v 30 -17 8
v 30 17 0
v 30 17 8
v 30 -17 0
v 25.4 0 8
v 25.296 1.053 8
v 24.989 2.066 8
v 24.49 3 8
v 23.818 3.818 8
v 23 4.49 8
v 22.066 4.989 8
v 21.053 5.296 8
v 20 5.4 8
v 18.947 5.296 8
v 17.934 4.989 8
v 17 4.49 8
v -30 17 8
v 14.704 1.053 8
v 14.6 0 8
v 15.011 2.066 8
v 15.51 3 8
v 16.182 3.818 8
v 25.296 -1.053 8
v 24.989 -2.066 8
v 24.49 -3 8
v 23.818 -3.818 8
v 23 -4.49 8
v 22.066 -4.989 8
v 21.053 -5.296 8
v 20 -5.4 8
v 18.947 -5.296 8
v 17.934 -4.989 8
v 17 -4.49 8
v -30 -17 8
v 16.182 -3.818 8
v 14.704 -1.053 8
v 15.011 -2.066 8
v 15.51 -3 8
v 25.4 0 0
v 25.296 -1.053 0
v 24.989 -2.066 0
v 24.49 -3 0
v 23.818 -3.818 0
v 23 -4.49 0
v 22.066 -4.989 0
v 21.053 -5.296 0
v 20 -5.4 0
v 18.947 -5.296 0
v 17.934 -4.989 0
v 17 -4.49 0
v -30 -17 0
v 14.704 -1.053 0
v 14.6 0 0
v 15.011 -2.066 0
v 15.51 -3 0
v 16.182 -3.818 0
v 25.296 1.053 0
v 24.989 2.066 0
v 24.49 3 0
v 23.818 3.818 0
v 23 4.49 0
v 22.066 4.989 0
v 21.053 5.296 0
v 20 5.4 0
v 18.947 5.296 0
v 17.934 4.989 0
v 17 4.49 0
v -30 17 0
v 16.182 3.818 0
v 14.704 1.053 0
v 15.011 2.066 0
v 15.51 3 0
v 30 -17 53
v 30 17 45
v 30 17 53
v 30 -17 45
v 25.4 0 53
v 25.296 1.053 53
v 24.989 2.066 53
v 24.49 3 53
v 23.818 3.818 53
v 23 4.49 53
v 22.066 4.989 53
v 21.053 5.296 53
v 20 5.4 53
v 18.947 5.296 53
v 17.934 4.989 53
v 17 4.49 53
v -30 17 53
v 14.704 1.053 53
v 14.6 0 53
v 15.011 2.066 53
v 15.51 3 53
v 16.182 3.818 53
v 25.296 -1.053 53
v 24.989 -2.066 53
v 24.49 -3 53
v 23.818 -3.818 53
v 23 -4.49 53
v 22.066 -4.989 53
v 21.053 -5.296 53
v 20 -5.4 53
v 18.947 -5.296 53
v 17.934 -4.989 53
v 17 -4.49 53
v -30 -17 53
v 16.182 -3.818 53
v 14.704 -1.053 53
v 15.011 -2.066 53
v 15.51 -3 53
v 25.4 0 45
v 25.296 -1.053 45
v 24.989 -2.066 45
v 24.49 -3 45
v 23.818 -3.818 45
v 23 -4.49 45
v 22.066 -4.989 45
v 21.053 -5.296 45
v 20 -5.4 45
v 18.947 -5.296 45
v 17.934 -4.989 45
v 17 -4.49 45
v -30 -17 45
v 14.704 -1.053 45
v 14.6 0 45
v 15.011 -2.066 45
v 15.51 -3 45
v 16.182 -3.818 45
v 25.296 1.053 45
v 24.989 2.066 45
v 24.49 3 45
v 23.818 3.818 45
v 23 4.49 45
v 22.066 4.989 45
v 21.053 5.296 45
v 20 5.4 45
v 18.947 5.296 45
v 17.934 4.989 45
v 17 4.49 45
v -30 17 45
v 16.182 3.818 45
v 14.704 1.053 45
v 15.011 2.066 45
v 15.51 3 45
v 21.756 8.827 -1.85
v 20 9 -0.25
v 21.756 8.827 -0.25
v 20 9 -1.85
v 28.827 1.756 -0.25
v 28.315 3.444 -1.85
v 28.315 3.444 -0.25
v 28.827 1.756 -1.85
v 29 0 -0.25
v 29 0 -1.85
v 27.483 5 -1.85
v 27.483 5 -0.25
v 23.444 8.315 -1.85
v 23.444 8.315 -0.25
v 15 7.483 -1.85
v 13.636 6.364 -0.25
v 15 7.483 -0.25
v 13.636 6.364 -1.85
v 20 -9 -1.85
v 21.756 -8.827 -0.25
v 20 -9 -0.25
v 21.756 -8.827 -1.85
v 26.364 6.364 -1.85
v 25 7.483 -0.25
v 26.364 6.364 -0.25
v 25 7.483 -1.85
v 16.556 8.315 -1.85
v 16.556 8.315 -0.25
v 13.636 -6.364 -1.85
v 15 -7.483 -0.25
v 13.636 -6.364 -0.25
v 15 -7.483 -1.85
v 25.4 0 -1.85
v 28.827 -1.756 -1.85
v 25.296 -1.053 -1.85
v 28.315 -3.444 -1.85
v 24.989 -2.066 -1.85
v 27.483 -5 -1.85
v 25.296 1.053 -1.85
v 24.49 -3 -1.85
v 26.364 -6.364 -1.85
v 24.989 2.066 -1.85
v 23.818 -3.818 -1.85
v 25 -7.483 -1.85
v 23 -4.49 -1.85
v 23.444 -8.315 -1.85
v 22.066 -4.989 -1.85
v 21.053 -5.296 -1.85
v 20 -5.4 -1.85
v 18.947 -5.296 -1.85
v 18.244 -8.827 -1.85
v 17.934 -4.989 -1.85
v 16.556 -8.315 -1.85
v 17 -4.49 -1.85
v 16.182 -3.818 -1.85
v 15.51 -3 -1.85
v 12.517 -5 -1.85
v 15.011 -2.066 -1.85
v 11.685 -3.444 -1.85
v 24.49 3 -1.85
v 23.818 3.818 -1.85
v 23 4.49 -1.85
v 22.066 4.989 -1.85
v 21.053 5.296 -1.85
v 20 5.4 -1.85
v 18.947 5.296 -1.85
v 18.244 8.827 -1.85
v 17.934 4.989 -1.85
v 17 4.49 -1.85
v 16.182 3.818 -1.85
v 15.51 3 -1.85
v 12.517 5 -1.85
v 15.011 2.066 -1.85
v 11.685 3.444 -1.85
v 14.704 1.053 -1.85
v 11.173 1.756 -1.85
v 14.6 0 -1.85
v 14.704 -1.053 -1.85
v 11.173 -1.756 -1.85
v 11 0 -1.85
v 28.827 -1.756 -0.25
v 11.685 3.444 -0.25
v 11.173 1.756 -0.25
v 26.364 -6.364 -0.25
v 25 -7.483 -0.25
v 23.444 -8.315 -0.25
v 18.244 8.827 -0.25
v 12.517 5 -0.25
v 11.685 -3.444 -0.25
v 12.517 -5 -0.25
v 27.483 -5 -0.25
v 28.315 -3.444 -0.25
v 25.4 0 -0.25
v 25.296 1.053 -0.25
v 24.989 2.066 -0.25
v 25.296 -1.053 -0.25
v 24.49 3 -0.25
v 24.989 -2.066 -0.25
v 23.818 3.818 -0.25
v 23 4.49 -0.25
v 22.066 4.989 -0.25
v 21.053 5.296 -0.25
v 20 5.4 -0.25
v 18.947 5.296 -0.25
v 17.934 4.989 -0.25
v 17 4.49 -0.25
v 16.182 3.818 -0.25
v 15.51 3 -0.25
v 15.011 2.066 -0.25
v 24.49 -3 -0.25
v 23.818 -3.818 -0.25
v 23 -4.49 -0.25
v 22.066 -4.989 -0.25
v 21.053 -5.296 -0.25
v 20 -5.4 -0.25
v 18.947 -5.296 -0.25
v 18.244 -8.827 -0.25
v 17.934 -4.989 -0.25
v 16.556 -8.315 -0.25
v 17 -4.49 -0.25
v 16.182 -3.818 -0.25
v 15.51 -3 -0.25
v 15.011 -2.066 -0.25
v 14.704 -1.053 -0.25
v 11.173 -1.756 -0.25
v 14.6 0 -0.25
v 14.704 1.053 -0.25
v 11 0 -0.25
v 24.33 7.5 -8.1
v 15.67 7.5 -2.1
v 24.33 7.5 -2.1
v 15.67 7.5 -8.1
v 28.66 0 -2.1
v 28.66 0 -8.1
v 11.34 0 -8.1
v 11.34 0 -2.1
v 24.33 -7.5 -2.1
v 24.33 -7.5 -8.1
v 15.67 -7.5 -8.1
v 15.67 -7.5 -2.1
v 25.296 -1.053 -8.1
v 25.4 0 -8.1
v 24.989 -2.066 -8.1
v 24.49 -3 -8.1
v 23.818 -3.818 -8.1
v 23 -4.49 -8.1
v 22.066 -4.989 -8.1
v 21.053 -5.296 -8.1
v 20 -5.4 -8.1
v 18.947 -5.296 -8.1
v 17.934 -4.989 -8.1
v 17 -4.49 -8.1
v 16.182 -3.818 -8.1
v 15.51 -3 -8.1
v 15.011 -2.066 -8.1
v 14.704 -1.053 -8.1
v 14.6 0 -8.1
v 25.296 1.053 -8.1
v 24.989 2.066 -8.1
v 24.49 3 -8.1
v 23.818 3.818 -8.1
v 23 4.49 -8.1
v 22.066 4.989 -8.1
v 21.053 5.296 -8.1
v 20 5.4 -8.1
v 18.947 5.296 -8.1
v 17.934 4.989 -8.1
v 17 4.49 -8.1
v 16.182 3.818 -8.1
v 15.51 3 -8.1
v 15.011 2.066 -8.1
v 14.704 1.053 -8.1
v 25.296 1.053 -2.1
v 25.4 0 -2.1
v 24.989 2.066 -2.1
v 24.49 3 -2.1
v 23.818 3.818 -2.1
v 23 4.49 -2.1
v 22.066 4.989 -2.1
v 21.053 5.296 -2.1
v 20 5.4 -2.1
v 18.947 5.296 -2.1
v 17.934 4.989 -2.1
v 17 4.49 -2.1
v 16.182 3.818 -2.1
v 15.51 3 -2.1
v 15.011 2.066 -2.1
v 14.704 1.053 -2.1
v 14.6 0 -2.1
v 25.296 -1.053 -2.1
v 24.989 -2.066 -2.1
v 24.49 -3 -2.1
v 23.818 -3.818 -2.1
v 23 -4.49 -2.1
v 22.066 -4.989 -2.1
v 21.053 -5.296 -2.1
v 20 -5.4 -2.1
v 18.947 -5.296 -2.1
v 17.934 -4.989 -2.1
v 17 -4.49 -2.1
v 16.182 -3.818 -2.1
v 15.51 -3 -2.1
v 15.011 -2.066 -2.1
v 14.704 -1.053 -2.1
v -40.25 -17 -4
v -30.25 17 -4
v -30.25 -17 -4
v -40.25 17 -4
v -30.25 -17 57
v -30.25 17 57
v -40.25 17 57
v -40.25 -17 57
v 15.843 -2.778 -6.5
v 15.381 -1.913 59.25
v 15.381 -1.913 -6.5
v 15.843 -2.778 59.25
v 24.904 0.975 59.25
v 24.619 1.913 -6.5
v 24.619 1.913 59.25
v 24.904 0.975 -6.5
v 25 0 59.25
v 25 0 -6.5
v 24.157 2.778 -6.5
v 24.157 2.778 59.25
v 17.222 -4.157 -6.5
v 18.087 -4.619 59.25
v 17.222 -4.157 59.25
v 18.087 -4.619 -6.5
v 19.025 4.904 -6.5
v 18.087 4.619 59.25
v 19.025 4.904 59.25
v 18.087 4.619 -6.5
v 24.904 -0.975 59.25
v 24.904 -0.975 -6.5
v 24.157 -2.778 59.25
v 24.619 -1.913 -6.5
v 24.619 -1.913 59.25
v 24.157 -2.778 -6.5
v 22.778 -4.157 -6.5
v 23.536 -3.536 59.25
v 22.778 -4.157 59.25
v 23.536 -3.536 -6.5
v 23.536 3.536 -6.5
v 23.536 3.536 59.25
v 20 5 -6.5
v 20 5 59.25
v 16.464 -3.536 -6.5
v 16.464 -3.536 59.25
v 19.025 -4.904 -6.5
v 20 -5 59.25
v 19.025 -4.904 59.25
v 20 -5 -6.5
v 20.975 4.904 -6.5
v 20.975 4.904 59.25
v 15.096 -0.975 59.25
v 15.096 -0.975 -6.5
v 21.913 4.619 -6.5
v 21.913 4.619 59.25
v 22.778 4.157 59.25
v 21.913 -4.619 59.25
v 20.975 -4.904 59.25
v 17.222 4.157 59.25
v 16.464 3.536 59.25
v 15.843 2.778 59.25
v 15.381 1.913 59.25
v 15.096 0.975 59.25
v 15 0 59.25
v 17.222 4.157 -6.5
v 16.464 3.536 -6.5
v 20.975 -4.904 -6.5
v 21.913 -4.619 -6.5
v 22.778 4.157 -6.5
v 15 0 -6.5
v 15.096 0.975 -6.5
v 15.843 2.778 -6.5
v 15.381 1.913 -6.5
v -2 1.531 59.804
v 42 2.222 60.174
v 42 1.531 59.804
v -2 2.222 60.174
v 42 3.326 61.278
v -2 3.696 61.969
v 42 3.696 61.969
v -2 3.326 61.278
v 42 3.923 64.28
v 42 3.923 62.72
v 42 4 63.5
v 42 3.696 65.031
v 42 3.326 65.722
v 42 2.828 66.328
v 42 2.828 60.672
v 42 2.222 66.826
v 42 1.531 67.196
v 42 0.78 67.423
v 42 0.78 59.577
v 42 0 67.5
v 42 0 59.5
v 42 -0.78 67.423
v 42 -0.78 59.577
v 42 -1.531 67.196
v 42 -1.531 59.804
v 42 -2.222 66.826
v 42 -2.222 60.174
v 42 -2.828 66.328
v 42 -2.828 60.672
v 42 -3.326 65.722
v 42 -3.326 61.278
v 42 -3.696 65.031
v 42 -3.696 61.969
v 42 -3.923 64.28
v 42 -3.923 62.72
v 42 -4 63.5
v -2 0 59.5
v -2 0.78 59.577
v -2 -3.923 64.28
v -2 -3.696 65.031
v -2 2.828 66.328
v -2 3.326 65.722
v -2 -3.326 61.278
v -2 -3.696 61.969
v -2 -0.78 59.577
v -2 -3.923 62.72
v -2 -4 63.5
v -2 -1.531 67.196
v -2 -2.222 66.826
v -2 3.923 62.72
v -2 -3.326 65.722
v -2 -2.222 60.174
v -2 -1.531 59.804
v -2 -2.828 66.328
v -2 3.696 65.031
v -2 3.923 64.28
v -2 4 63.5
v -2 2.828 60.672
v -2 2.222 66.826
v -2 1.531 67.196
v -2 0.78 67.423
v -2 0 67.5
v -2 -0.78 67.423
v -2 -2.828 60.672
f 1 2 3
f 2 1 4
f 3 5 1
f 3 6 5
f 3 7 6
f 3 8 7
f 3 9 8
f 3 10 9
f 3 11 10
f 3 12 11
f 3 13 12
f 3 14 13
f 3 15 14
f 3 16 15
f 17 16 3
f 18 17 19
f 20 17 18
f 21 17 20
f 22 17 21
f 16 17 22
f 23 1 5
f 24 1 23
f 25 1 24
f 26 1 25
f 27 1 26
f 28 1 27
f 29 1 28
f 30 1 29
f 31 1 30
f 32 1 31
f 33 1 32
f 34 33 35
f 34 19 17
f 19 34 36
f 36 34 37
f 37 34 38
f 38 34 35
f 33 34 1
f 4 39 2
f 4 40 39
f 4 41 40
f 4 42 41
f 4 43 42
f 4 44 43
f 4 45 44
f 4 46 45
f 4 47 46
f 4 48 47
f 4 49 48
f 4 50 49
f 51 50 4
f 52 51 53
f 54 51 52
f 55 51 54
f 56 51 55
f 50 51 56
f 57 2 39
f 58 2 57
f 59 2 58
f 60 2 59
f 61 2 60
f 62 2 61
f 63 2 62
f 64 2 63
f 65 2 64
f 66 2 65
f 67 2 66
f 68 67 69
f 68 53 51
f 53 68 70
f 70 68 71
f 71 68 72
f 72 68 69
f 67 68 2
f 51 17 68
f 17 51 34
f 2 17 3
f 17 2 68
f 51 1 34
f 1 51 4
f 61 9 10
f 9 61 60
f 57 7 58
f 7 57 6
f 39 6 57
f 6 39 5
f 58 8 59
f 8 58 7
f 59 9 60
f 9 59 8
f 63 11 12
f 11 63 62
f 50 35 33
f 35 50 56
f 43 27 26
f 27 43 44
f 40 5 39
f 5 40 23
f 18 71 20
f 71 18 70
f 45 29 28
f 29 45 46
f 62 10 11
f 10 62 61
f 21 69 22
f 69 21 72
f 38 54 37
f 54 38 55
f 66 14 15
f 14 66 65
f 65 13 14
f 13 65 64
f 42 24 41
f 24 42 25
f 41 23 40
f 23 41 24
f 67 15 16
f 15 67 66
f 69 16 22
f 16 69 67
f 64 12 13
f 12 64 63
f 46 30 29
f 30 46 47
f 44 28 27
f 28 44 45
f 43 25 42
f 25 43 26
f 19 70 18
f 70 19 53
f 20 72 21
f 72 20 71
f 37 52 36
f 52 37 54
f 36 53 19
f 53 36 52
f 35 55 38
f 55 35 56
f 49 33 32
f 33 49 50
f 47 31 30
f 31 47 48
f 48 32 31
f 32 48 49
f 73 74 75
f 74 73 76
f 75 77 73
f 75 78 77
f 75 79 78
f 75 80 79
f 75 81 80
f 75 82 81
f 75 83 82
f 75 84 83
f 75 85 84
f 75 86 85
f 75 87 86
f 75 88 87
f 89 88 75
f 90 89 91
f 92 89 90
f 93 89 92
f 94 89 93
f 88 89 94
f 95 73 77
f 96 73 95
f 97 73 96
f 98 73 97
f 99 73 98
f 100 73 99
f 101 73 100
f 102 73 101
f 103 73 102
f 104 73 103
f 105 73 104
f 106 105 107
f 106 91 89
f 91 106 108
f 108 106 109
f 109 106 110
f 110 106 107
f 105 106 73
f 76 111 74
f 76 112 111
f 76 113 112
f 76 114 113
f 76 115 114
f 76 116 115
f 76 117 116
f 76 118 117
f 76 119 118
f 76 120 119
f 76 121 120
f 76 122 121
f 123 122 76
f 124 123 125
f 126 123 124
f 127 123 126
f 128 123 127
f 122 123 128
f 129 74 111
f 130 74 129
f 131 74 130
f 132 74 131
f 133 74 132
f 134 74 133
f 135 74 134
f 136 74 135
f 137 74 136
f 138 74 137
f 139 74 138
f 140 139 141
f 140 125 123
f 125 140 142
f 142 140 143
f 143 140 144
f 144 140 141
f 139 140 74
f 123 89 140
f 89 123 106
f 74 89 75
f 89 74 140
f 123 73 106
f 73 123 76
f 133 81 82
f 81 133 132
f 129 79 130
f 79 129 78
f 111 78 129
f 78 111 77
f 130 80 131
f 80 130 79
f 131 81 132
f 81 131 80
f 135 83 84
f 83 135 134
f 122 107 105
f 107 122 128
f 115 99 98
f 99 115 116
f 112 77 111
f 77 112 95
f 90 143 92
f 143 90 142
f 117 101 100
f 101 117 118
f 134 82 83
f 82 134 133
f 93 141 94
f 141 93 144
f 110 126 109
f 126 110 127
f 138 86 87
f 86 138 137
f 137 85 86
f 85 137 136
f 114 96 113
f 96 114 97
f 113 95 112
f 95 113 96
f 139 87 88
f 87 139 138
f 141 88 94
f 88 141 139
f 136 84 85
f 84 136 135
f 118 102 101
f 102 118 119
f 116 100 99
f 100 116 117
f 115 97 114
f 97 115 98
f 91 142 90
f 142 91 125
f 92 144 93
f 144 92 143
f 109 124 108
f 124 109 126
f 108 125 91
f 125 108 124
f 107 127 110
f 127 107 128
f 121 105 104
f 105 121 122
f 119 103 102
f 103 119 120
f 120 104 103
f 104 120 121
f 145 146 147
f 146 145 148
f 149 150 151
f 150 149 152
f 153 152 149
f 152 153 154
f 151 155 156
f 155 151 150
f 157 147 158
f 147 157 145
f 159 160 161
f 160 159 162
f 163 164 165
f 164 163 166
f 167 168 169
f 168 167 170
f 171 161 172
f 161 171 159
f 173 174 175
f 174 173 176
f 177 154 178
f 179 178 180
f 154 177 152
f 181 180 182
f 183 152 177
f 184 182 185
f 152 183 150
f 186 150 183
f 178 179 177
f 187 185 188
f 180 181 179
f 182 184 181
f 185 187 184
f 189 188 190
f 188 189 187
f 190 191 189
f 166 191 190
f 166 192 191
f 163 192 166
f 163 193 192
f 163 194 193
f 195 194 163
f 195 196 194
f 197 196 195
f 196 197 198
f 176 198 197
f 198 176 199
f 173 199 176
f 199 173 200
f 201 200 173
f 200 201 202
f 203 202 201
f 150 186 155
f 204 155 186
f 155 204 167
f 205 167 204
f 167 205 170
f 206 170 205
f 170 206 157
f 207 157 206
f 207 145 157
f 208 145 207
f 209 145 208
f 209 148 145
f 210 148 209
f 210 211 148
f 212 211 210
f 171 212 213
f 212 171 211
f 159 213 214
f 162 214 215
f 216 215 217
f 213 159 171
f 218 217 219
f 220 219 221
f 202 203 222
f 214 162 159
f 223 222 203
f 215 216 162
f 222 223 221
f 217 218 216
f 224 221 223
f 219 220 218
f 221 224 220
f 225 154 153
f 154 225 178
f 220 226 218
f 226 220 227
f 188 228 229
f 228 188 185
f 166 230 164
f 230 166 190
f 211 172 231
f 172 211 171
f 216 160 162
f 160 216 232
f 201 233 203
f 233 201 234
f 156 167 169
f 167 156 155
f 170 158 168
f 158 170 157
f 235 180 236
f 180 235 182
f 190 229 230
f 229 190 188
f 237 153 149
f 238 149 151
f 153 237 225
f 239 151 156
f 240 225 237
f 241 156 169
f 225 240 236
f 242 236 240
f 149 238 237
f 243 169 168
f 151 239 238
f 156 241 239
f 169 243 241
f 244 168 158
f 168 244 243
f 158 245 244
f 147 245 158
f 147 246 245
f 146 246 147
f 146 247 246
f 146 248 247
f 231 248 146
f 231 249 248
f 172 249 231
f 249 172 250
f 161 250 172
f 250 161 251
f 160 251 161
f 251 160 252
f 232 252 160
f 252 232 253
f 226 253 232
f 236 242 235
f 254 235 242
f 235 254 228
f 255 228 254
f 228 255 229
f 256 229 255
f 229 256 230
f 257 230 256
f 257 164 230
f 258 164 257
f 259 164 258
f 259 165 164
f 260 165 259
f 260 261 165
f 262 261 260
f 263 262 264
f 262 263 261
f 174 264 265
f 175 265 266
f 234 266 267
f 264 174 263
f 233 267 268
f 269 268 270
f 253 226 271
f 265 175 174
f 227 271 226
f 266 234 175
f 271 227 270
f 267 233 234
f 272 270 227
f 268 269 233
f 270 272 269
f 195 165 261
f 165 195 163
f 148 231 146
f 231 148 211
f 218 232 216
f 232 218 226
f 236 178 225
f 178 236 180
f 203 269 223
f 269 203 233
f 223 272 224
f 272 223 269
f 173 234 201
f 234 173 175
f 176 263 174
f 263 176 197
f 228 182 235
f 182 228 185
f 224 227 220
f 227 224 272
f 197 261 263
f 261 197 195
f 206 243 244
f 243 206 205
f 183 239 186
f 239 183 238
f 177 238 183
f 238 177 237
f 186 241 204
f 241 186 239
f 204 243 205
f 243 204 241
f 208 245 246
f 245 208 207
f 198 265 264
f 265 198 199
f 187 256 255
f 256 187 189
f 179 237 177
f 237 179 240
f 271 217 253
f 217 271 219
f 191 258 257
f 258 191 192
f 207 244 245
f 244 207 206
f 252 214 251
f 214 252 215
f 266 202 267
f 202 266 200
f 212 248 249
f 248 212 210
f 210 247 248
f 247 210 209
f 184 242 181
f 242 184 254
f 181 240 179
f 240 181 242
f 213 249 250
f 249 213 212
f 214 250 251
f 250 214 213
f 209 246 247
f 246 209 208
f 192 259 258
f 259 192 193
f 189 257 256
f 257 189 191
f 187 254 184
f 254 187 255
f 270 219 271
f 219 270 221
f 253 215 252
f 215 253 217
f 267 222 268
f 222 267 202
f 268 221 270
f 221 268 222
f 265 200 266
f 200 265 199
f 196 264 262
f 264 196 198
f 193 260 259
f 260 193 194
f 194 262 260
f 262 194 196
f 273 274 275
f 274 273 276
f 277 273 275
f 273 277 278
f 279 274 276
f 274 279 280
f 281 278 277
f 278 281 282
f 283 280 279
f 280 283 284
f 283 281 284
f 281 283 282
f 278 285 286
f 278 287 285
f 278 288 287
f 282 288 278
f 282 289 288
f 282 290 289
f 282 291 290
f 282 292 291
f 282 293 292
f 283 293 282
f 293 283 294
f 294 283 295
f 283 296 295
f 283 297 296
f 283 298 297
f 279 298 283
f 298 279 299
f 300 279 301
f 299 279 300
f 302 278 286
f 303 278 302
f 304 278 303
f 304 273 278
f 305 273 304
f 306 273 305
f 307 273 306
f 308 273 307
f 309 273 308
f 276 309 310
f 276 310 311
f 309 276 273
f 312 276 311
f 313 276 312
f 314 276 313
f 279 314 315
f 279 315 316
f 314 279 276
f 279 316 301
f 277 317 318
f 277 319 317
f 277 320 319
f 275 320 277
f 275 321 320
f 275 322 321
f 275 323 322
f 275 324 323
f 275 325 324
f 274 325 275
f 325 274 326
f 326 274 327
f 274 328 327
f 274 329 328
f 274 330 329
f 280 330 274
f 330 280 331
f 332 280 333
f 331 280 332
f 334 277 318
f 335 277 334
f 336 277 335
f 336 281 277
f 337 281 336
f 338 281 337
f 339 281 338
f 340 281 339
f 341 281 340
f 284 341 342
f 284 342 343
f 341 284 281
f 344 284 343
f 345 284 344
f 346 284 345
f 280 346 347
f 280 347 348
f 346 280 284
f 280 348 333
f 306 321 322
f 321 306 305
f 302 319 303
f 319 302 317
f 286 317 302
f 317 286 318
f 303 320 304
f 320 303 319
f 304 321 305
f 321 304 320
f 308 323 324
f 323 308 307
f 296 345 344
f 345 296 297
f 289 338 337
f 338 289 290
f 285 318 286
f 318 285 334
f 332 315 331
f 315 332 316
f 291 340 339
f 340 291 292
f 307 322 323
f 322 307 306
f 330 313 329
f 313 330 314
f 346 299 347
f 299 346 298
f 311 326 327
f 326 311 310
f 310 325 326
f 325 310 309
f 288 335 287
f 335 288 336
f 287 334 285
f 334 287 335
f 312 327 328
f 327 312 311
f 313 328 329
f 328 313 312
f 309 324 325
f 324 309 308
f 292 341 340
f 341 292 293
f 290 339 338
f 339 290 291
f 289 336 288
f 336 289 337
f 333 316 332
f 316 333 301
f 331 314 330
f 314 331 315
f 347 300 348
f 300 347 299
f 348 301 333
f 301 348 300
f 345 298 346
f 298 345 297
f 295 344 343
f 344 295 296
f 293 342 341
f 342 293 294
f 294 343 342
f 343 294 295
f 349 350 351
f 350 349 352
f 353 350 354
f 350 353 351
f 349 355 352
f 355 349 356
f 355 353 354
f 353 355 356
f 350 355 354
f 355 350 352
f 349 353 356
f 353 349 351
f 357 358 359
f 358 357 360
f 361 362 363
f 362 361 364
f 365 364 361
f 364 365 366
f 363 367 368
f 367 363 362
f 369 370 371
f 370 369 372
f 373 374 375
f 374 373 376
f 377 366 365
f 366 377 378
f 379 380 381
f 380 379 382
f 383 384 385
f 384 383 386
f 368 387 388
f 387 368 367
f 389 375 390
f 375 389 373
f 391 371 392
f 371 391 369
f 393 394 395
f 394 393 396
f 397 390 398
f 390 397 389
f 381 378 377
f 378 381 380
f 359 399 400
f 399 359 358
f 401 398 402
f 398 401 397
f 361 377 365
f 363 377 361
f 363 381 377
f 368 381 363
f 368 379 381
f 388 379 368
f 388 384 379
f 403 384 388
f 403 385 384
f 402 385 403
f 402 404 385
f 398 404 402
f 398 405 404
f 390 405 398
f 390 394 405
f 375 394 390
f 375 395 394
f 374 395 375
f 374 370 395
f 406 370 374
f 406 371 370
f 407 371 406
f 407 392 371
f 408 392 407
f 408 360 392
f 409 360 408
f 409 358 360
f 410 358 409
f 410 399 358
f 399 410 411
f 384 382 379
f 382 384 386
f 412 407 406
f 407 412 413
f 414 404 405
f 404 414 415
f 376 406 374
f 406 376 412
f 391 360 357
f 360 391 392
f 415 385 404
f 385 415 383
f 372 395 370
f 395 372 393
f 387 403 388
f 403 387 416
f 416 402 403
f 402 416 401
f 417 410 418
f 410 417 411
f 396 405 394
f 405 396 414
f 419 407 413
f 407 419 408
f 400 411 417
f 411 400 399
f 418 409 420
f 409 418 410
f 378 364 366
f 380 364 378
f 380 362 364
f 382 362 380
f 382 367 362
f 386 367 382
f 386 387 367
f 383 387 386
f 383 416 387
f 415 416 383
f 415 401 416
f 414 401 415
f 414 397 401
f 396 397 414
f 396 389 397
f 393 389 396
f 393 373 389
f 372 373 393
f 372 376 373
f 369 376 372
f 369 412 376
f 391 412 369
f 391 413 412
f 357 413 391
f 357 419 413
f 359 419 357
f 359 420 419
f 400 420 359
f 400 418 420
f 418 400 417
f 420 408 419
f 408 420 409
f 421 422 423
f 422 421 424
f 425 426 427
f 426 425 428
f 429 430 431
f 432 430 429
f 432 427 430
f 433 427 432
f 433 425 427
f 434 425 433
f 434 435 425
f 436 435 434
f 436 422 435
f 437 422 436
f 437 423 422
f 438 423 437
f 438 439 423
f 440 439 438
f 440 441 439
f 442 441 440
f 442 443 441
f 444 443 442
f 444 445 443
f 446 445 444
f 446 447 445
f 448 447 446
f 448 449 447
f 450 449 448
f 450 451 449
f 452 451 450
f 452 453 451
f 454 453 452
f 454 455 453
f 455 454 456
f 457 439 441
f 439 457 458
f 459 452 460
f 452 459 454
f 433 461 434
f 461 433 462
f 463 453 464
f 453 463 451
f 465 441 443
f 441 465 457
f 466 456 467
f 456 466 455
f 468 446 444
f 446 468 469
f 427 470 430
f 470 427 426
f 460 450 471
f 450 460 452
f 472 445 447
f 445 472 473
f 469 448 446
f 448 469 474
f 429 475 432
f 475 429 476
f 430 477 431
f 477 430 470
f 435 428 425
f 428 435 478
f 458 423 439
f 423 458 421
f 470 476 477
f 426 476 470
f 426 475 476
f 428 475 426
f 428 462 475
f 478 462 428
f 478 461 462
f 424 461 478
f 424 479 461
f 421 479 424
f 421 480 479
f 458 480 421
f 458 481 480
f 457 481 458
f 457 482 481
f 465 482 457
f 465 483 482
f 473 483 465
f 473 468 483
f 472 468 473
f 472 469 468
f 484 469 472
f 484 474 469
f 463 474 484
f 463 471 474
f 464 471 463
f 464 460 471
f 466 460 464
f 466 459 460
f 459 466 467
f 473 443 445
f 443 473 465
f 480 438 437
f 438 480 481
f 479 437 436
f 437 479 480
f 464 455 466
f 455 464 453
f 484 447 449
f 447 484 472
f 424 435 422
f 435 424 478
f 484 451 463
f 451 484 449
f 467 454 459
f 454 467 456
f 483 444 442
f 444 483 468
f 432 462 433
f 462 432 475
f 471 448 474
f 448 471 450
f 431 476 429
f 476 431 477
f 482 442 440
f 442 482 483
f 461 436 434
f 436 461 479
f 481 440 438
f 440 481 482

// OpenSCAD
$fn = 32;

// ------------------------------------------------------------------------
// C clamp: throat 45 mm, screw d10
// Every part is its own module, assembly() places every instance.
// ------------------------------------------------------------------------

// --- part 1 ---
module clamp_arm() {
  difference() {
    translate([-30, -17, 0]) cube([60, 34, 8]);
    translate([20, 0, -1]) cylinder(h = 10, d = 10.8);
  }
}

// --- part 2 ---
module clamp_spine() {
  difference() {
    translate([-30.5, -17, 0]) cube([61, 34, 10]);
  }
}

// --- part 3 ---
module clamp_screw() {
  translate([0, 0, -32.875]) cylinder(h = 65.75, d = 10);
}

// --- part 4 ---
module clamp_washer() {
  difference() {
      translate([0, 0, 0]) cylinder(h = 1.6, d = 18);
      translate([0, 0, -1]) cylinder(h = 3.6, d = 10.8);
    }
}

// --- part 5 ---
module clamp_nut() {
  difference() {
    linear_extrude(height = 6) polygon(points = [[8.66, 0], [4.33, 7.5], [-4.33, 7.5], [-8.66, 0], [-4.33, -7.5], [4.33, -7.5]]);
    translate([0, 0, -1]) cylinder(h = 8, d = 10.8);
  }
}

// --- part 6 ---
module tommy_bar() {
  translate([0, 0, -22]) cylinder(h = 44, d = 8);
}

// --- assembly ---
module assembly() {
  color([0.80, 0.24, 0.20]) translate([0, 0, 0]) rotate([0, 0, 0]) clamp_arm();
  color([0.20, 0.45, 0.75]) translate([0, 0, 45]) rotate([0, 0, 0]) clamp_arm();
  color([0.25, 0.62, 0.32]) translate([-40.25, 0, 26.5]) rotate([0, 90, 0]) clamp_spine();
  color([0.92, 0.70, 0.18]) translate([20, 0, 26.375]) rotate([0, 0, 0]) clamp_screw();
  color([0.58, 0.35, 0.70]) translate([20, 0, -1.85]) rotate([0, 0, 0]) clamp_washer();
  color([0.16, 0.66, 0.66]) translate([20, 0, -8.1]) rotate([0, 0, 0]) clamp_nut();
  color([0.85, 0.48, 0.18]) translate([20, 0, 63.5]) rotate([0, 90, 0]) tommy_bar();
}

assembly();
